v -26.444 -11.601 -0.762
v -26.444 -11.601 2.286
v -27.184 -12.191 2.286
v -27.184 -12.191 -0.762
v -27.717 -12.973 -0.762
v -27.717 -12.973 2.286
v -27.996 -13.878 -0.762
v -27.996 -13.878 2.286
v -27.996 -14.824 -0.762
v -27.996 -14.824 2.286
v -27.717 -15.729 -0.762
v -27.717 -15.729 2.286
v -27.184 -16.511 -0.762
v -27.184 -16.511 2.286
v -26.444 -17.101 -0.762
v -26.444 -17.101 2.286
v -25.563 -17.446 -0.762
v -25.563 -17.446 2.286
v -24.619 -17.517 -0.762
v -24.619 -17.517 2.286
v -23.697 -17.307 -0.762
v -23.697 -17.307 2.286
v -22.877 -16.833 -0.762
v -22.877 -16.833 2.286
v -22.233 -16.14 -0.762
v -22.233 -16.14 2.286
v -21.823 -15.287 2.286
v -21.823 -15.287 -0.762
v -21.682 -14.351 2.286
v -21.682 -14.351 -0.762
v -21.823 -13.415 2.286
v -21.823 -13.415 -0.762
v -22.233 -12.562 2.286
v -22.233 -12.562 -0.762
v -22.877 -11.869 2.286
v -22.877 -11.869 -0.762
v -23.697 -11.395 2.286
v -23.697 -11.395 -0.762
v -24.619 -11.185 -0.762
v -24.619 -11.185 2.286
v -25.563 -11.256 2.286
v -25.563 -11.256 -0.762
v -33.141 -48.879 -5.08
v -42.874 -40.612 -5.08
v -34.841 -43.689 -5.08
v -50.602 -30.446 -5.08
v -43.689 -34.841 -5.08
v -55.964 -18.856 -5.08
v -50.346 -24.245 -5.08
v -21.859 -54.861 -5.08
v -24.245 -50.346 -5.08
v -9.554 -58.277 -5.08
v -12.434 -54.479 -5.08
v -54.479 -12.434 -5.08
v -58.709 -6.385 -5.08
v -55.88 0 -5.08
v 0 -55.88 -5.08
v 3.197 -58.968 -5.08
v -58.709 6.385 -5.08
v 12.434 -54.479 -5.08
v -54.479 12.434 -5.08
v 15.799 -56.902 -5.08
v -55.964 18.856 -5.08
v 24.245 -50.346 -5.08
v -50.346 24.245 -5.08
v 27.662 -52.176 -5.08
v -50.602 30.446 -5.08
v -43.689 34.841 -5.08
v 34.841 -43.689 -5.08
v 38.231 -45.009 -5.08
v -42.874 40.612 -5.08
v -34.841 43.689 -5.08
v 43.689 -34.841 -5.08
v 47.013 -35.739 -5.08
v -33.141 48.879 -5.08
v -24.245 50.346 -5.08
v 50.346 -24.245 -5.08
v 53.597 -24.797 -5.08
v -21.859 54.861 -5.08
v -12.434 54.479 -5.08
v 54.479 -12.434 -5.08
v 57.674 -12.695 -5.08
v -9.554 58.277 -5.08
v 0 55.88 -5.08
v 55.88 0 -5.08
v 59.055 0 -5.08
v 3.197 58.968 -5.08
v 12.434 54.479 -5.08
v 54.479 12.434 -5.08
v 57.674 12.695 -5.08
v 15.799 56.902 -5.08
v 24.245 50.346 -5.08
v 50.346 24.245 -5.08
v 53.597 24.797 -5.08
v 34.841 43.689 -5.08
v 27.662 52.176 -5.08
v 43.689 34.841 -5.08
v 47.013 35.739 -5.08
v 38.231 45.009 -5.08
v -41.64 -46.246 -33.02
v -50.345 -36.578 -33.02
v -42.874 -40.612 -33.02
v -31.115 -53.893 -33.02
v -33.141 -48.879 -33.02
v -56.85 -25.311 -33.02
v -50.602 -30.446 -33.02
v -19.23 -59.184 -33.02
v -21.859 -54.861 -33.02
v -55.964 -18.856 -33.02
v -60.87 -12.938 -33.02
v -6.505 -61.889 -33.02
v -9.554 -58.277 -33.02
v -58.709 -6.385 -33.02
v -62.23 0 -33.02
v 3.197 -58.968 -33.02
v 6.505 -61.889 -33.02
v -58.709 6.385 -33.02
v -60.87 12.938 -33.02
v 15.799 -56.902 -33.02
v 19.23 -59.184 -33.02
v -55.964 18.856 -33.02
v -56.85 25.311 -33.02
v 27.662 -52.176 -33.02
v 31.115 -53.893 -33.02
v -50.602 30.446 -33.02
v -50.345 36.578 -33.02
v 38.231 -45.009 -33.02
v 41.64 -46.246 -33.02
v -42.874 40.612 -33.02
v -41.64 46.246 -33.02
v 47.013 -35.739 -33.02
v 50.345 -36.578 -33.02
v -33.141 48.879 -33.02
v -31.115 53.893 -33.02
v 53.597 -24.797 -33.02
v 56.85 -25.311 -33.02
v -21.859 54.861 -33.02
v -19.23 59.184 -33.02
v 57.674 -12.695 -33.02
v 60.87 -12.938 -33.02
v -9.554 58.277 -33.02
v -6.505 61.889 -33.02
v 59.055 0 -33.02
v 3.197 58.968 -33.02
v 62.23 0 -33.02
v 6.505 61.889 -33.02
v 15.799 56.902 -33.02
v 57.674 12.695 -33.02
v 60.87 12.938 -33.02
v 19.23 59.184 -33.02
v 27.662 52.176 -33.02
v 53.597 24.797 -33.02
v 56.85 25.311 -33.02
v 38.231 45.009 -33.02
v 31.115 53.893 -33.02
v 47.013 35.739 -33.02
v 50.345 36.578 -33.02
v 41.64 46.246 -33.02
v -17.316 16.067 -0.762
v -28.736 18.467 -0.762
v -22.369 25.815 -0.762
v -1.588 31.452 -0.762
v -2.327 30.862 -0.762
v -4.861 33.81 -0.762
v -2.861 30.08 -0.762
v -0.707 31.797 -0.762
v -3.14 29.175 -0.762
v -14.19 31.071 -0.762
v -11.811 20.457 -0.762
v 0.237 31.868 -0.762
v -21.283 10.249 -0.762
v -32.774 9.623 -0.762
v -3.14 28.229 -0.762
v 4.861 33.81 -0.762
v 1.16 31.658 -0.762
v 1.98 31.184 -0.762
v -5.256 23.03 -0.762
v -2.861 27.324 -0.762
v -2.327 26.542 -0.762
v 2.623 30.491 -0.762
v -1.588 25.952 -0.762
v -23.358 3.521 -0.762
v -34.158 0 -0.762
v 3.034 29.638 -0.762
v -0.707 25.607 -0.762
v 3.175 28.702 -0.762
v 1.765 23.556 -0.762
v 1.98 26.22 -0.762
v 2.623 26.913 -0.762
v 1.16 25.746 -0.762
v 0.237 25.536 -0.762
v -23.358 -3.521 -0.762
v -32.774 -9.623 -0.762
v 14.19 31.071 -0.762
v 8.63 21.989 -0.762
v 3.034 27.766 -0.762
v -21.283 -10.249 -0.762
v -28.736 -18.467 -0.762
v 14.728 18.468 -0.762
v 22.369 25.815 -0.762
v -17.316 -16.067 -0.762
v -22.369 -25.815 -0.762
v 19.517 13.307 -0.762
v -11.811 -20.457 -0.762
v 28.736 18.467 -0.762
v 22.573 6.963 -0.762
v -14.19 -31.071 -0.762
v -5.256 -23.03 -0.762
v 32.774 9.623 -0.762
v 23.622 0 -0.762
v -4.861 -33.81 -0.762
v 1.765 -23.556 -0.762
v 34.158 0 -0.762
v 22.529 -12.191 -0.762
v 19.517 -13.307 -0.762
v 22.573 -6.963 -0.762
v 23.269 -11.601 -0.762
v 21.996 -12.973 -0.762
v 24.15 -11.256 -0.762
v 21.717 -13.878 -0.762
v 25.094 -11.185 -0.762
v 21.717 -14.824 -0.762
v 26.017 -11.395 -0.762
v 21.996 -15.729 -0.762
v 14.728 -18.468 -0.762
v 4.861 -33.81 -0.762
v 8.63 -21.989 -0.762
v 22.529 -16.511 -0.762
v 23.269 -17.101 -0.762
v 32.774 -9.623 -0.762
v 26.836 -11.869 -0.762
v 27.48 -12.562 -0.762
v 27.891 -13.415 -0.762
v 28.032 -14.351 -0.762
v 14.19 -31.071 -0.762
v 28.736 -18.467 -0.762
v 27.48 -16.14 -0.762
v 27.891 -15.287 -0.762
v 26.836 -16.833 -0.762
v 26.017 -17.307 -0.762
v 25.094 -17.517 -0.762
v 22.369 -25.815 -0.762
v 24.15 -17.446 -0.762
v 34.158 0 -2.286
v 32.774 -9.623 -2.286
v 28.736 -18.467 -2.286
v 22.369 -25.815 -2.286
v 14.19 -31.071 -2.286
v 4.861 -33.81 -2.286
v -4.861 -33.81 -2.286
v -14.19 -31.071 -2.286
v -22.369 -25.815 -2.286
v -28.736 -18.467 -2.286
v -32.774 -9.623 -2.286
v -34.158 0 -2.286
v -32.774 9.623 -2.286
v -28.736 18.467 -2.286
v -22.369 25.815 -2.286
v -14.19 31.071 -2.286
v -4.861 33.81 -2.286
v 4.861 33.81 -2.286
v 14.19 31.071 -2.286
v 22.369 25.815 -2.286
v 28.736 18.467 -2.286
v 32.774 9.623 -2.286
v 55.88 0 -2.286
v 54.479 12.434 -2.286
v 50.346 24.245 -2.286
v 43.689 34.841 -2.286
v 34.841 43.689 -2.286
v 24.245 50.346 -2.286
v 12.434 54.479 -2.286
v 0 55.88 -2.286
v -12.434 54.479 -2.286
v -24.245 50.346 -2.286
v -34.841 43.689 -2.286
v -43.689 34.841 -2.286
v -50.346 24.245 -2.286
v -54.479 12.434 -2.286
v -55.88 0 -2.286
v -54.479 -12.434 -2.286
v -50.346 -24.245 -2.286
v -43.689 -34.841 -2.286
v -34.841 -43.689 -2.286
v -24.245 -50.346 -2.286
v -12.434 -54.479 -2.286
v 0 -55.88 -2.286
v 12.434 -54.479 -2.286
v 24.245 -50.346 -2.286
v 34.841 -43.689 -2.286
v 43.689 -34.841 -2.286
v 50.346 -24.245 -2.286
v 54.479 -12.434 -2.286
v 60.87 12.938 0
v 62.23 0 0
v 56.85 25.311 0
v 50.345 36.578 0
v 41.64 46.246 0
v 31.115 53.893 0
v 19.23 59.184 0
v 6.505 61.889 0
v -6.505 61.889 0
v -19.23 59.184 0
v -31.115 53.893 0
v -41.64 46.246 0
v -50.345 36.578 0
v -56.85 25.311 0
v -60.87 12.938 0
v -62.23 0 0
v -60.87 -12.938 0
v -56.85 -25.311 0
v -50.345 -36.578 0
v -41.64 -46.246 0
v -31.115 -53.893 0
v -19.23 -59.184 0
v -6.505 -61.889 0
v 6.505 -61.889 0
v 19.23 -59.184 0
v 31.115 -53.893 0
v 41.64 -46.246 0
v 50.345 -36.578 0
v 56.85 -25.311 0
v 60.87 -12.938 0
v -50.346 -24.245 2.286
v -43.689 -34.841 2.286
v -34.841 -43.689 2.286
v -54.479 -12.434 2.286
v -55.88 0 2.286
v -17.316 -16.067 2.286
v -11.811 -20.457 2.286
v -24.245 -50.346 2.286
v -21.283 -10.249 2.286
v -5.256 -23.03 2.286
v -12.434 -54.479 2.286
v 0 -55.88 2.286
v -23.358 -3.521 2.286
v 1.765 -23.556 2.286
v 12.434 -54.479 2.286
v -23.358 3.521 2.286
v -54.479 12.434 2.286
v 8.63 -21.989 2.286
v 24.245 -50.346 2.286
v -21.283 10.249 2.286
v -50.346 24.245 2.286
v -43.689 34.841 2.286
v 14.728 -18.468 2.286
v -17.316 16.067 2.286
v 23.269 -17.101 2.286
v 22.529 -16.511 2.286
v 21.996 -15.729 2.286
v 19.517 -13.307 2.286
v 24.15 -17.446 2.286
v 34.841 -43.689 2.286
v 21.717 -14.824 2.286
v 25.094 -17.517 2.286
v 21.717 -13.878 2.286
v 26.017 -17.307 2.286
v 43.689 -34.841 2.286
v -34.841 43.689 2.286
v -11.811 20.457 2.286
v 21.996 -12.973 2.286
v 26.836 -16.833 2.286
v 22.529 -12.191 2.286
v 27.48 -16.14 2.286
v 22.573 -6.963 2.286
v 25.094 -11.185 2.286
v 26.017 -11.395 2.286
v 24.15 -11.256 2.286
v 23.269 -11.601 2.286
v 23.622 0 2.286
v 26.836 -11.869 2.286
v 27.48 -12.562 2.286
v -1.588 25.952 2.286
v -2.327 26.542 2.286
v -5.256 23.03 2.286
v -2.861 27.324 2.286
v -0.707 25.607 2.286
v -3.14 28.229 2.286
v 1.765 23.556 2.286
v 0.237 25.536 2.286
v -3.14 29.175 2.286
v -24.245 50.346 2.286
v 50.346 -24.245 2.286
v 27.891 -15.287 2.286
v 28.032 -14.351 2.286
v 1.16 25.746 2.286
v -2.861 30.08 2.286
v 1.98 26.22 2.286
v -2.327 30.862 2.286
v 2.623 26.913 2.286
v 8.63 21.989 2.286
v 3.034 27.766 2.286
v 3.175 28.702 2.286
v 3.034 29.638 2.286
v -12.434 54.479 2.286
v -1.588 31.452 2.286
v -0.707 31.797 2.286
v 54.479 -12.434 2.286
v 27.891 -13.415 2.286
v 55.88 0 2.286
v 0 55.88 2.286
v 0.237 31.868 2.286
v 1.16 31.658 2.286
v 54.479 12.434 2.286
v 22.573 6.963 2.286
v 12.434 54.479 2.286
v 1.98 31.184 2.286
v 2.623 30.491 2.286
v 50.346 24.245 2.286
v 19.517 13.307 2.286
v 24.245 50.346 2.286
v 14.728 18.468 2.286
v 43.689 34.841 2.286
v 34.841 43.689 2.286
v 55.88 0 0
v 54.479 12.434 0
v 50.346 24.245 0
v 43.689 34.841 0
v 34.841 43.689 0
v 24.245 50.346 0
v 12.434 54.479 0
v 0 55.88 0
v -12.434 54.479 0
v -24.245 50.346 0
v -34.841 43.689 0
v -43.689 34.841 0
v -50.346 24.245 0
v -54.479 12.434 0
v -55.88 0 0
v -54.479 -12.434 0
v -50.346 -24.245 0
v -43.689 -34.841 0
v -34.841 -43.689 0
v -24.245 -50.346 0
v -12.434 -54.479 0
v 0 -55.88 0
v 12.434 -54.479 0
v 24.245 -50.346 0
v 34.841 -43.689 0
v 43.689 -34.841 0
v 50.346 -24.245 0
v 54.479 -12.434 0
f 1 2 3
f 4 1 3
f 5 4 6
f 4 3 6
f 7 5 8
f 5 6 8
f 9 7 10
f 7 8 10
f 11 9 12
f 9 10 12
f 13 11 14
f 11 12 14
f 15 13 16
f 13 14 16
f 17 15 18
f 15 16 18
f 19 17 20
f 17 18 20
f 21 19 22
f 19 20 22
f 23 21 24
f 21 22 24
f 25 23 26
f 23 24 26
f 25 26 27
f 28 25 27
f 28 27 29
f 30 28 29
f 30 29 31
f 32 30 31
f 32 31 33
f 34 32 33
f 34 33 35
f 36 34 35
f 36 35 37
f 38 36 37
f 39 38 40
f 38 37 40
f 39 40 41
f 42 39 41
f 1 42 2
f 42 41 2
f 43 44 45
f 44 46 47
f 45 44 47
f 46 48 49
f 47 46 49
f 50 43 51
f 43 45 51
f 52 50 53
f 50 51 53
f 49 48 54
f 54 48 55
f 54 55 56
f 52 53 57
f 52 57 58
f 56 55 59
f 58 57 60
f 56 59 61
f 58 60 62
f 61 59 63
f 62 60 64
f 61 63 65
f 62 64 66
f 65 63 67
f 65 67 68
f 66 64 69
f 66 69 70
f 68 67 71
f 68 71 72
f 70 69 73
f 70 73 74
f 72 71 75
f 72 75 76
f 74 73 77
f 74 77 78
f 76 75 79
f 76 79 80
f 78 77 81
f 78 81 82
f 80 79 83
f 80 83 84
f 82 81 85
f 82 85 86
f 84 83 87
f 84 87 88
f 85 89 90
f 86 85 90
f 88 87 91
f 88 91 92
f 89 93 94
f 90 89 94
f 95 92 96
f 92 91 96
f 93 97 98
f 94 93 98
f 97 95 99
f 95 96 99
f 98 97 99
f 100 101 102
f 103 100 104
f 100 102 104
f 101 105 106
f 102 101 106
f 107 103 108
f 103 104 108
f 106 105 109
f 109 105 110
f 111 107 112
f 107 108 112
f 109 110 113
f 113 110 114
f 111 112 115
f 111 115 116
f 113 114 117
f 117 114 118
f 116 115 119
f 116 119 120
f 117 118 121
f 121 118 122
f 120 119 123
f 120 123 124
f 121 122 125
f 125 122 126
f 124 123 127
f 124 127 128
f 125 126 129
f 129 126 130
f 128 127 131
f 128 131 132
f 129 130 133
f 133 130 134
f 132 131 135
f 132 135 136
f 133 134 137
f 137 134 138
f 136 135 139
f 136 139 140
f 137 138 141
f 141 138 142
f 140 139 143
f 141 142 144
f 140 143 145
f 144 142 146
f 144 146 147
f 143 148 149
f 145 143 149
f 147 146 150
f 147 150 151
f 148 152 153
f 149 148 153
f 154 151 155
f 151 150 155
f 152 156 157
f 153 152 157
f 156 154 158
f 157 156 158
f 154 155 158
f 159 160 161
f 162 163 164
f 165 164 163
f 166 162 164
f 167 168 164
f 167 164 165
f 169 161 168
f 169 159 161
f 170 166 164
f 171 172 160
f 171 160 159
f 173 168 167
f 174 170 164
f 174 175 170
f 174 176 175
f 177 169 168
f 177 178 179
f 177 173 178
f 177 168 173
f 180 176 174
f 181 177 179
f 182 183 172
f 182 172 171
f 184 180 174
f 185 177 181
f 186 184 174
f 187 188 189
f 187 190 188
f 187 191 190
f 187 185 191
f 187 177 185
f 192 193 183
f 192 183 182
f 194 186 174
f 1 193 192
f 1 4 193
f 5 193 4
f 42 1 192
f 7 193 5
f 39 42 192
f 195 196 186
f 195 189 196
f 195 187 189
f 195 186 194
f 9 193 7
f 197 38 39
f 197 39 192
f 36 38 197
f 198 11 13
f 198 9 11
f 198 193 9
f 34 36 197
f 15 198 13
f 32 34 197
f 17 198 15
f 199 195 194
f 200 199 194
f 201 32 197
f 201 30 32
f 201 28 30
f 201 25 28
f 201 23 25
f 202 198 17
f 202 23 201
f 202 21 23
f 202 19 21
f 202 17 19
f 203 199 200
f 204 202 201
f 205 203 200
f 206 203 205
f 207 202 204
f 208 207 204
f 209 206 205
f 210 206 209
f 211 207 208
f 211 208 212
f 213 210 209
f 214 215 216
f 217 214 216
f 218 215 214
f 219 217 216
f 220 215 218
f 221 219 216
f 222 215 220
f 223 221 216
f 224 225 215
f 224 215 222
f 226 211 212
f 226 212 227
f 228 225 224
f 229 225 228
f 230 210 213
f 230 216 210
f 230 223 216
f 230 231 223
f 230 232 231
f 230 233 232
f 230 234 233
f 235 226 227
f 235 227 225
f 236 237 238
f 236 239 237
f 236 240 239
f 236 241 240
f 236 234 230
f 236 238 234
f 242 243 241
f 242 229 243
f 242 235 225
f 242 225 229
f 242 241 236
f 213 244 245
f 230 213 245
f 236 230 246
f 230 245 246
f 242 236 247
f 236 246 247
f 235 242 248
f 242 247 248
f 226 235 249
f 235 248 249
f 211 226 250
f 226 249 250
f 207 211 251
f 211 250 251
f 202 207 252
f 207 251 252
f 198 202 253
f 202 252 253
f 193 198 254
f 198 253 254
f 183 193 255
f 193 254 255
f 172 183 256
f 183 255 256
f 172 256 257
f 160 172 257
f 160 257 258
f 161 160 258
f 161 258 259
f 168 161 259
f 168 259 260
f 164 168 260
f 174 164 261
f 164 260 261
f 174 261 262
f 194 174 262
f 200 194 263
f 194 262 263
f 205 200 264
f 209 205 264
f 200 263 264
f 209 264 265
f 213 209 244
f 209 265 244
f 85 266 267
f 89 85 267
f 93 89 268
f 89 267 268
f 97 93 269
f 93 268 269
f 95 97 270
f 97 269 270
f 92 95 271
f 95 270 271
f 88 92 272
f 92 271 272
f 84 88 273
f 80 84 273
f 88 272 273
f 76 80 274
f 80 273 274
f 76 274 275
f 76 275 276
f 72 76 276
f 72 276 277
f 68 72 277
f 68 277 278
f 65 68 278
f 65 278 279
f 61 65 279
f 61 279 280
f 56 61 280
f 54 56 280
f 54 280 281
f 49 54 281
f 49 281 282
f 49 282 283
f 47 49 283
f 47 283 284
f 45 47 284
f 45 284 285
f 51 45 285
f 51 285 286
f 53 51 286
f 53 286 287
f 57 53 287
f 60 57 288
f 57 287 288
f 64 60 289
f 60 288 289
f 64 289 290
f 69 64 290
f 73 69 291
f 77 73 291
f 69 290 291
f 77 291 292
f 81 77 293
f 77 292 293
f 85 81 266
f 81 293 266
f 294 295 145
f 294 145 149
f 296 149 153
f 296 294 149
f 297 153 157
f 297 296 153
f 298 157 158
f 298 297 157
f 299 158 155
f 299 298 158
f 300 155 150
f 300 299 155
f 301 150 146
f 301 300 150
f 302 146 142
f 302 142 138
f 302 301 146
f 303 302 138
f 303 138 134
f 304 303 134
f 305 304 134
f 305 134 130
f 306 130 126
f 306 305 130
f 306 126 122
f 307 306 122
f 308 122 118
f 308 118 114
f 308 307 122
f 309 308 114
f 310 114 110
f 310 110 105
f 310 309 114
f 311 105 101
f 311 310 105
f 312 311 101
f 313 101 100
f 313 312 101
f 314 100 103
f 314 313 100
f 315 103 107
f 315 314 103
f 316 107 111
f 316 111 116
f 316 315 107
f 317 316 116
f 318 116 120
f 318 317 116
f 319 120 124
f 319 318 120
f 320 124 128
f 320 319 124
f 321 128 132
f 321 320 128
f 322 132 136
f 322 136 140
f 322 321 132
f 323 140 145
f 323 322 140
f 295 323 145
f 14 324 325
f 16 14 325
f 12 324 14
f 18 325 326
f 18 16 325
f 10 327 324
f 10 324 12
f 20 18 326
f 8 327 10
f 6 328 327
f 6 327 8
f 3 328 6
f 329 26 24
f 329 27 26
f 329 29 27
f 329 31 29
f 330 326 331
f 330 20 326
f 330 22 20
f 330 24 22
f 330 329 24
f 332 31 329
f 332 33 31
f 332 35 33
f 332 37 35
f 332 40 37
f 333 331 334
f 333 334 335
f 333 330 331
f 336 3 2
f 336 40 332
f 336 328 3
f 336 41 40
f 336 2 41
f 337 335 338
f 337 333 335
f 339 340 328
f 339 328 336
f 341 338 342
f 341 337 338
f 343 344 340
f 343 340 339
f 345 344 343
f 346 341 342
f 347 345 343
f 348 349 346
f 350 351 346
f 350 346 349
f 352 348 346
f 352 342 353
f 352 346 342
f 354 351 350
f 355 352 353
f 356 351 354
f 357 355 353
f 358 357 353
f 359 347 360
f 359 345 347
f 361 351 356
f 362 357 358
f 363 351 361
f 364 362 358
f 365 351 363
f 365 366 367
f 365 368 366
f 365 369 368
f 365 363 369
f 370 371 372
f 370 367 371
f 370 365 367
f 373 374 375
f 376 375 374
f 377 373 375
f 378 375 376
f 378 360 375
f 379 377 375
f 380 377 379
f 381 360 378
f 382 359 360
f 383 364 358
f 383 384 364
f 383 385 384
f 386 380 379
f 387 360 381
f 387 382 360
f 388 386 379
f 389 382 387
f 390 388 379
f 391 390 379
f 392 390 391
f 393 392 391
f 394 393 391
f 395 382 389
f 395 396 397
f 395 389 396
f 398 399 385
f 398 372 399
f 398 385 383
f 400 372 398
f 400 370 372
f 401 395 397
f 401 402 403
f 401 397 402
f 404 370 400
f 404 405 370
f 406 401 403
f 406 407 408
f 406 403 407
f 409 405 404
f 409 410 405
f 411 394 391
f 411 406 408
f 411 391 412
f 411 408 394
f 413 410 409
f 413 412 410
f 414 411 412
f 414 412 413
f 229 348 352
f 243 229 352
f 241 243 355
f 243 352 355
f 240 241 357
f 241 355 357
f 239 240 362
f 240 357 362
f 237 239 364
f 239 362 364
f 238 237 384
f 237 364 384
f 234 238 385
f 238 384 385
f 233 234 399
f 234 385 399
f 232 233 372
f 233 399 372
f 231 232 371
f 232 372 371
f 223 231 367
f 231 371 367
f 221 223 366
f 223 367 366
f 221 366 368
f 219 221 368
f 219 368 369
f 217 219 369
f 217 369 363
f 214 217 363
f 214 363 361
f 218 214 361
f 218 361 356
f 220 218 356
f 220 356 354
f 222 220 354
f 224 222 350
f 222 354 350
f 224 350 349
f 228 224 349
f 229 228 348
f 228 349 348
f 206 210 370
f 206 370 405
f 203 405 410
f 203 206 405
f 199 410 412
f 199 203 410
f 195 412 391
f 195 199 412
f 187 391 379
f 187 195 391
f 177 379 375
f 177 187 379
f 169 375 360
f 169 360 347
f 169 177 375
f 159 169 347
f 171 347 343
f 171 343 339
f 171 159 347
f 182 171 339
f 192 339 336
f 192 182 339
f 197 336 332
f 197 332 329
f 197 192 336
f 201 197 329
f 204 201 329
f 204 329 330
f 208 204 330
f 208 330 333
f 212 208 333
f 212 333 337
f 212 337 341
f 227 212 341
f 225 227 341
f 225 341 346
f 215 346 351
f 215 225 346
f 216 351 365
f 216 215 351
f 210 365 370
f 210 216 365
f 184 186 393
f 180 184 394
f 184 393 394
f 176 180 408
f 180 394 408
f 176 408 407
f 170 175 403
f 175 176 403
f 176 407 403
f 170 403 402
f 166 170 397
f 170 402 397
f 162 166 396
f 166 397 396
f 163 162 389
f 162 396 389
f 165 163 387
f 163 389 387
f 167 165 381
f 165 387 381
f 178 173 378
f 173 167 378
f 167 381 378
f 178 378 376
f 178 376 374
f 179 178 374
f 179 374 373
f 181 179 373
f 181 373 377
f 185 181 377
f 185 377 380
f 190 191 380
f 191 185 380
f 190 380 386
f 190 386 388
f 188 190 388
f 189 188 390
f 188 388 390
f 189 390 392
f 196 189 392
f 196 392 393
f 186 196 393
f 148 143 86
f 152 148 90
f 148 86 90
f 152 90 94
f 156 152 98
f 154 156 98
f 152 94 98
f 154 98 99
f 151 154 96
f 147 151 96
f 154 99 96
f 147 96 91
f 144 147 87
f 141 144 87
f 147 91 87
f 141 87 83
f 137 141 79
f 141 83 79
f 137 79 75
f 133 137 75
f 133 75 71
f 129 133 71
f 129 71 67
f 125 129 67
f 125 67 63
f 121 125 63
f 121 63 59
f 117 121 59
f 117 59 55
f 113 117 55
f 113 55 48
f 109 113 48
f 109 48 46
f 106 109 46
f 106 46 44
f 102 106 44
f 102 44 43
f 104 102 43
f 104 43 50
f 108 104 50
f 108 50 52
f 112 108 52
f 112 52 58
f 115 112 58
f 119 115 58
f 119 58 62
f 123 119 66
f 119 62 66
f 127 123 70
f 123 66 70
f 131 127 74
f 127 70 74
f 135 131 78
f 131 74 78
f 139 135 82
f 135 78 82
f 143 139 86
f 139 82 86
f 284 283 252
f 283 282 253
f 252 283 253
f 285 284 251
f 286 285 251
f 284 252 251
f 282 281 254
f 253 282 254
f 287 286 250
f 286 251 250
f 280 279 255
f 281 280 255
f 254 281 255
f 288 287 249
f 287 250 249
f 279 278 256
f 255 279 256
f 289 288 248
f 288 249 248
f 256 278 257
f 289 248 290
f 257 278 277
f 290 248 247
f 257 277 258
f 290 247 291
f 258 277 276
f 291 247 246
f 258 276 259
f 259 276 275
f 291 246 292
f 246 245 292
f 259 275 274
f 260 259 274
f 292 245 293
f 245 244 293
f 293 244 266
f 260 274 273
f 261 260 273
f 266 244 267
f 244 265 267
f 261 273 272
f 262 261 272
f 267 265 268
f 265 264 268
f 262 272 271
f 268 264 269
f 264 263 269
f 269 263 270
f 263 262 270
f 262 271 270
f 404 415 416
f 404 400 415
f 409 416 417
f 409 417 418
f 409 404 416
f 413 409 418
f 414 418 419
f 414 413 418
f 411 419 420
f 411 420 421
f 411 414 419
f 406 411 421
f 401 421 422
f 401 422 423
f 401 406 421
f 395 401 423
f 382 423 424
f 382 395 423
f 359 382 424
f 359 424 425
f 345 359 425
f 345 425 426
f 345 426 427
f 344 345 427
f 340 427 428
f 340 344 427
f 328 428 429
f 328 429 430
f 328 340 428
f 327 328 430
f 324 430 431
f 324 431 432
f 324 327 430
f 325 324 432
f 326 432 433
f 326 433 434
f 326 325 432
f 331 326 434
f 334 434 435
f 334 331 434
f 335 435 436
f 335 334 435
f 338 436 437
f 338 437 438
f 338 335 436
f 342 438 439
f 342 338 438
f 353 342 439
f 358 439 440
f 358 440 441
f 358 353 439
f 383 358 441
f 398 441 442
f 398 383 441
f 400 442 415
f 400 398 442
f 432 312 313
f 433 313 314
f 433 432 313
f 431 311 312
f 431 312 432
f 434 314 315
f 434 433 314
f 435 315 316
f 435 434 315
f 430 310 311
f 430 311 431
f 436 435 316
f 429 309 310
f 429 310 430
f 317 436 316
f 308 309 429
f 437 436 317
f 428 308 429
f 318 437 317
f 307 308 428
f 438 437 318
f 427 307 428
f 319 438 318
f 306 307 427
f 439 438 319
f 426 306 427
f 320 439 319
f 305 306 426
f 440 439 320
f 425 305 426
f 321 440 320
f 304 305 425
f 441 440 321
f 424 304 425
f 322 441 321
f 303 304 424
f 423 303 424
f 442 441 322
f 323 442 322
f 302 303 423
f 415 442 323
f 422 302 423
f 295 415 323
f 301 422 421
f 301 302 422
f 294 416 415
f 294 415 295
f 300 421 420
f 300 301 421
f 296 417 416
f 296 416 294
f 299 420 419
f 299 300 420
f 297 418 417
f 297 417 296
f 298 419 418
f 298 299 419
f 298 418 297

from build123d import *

# Parameters (mm, degrees)
F0_R            = 55.88
F0_R_2          = 23.622
F1_DEPTH        = 2.286
F0_R_3          = 59.055
F2_DEPTH        = 5.08
F0_R_4          = 62.23
F3_DEPTH        = 33.02
F4_R            = 3.175
F5_DEPTH        = 25.4
F5_COPIES_COUNT = 3
F7_R            = 34.1580603644
F7_R_2          = 3.175
F7_R_3          = 23.622
F8_DEPTH        = 1.524


# Not quite as in the source:
# - a pattern or mirror of a feature is missing from the dataset's text; its kind, count and spacing are read off the source's solid


with BuildPart() as f1:
    # F0 (on Top) → F1 (new body, symmetric)
    with BuildSketch(Plane.XY):
        Circle(F0_R)
        Circle(F0_R_2, mode=Mode.SUBTRACT)
    extrude(amount=F1_DEPTH, both=True)

    # F0 (on Top) → F2 (join)
    with BuildSketch(Plane.XY):
        Circle(F0_R_3)
        Circle(F0_R, mode=Mode.SUBTRACT)
    extrude(amount=-F2_DEPTH)

    # F0 (on Top) → F3 (join)
    with BuildSketch(Plane.XY):
        Circle(F0_R_4)
        Circle(F0_R_3, mode=Mode.SUBTRACT)
    extrude(amount=-F3_DEPTH)

    # F4 (on face) → F5 (cut)
    with BuildSketch(Plane.XY.offset(2.286)):
        with Locations((0, 28.702)):
            Circle(F4_R)
    f5 = extrude(amount=-F5_DEPTH, mode=Mode.SUBTRACT)

    # F5_copies: F5 ×3 about axis
    f5_copies_axis = Axis((0, 0, 0), (0, 0, 1))
    for i in range(1, F5_COPIES_COUNT):
        add(f5.rotate(f5_copies_axis, i * 360 / F5_COPIES_COUNT), mode=Mode.SUBTRACT)

    # F7 (on face) → F8 (cut)
    with BuildSketch(Plane(origin=(0, 0, -2.286), x_dir=(1, 0, 0), z_dir=(0, 0, -1))):
        Circle(F7_R)
        with Locations((0, -28.702)):
            Circle(F7_R_2, mode=Mode.SUBTRACT)
        Circle(F7_R_3, mode=Mode.SUBTRACT)
        with Locations((-24.8566611394, 14.351)):
            Circle(F7_R_2, mode=Mode.SUBTRACT)
        with Locations((24.8566611394, 14.351)):
            Circle(F7_R_2, mode=Mode.SUBTRACT)
    extrude(amount=-F8_DEPTH, mode=Mode.SUBTRACT)


solid = f1.part
